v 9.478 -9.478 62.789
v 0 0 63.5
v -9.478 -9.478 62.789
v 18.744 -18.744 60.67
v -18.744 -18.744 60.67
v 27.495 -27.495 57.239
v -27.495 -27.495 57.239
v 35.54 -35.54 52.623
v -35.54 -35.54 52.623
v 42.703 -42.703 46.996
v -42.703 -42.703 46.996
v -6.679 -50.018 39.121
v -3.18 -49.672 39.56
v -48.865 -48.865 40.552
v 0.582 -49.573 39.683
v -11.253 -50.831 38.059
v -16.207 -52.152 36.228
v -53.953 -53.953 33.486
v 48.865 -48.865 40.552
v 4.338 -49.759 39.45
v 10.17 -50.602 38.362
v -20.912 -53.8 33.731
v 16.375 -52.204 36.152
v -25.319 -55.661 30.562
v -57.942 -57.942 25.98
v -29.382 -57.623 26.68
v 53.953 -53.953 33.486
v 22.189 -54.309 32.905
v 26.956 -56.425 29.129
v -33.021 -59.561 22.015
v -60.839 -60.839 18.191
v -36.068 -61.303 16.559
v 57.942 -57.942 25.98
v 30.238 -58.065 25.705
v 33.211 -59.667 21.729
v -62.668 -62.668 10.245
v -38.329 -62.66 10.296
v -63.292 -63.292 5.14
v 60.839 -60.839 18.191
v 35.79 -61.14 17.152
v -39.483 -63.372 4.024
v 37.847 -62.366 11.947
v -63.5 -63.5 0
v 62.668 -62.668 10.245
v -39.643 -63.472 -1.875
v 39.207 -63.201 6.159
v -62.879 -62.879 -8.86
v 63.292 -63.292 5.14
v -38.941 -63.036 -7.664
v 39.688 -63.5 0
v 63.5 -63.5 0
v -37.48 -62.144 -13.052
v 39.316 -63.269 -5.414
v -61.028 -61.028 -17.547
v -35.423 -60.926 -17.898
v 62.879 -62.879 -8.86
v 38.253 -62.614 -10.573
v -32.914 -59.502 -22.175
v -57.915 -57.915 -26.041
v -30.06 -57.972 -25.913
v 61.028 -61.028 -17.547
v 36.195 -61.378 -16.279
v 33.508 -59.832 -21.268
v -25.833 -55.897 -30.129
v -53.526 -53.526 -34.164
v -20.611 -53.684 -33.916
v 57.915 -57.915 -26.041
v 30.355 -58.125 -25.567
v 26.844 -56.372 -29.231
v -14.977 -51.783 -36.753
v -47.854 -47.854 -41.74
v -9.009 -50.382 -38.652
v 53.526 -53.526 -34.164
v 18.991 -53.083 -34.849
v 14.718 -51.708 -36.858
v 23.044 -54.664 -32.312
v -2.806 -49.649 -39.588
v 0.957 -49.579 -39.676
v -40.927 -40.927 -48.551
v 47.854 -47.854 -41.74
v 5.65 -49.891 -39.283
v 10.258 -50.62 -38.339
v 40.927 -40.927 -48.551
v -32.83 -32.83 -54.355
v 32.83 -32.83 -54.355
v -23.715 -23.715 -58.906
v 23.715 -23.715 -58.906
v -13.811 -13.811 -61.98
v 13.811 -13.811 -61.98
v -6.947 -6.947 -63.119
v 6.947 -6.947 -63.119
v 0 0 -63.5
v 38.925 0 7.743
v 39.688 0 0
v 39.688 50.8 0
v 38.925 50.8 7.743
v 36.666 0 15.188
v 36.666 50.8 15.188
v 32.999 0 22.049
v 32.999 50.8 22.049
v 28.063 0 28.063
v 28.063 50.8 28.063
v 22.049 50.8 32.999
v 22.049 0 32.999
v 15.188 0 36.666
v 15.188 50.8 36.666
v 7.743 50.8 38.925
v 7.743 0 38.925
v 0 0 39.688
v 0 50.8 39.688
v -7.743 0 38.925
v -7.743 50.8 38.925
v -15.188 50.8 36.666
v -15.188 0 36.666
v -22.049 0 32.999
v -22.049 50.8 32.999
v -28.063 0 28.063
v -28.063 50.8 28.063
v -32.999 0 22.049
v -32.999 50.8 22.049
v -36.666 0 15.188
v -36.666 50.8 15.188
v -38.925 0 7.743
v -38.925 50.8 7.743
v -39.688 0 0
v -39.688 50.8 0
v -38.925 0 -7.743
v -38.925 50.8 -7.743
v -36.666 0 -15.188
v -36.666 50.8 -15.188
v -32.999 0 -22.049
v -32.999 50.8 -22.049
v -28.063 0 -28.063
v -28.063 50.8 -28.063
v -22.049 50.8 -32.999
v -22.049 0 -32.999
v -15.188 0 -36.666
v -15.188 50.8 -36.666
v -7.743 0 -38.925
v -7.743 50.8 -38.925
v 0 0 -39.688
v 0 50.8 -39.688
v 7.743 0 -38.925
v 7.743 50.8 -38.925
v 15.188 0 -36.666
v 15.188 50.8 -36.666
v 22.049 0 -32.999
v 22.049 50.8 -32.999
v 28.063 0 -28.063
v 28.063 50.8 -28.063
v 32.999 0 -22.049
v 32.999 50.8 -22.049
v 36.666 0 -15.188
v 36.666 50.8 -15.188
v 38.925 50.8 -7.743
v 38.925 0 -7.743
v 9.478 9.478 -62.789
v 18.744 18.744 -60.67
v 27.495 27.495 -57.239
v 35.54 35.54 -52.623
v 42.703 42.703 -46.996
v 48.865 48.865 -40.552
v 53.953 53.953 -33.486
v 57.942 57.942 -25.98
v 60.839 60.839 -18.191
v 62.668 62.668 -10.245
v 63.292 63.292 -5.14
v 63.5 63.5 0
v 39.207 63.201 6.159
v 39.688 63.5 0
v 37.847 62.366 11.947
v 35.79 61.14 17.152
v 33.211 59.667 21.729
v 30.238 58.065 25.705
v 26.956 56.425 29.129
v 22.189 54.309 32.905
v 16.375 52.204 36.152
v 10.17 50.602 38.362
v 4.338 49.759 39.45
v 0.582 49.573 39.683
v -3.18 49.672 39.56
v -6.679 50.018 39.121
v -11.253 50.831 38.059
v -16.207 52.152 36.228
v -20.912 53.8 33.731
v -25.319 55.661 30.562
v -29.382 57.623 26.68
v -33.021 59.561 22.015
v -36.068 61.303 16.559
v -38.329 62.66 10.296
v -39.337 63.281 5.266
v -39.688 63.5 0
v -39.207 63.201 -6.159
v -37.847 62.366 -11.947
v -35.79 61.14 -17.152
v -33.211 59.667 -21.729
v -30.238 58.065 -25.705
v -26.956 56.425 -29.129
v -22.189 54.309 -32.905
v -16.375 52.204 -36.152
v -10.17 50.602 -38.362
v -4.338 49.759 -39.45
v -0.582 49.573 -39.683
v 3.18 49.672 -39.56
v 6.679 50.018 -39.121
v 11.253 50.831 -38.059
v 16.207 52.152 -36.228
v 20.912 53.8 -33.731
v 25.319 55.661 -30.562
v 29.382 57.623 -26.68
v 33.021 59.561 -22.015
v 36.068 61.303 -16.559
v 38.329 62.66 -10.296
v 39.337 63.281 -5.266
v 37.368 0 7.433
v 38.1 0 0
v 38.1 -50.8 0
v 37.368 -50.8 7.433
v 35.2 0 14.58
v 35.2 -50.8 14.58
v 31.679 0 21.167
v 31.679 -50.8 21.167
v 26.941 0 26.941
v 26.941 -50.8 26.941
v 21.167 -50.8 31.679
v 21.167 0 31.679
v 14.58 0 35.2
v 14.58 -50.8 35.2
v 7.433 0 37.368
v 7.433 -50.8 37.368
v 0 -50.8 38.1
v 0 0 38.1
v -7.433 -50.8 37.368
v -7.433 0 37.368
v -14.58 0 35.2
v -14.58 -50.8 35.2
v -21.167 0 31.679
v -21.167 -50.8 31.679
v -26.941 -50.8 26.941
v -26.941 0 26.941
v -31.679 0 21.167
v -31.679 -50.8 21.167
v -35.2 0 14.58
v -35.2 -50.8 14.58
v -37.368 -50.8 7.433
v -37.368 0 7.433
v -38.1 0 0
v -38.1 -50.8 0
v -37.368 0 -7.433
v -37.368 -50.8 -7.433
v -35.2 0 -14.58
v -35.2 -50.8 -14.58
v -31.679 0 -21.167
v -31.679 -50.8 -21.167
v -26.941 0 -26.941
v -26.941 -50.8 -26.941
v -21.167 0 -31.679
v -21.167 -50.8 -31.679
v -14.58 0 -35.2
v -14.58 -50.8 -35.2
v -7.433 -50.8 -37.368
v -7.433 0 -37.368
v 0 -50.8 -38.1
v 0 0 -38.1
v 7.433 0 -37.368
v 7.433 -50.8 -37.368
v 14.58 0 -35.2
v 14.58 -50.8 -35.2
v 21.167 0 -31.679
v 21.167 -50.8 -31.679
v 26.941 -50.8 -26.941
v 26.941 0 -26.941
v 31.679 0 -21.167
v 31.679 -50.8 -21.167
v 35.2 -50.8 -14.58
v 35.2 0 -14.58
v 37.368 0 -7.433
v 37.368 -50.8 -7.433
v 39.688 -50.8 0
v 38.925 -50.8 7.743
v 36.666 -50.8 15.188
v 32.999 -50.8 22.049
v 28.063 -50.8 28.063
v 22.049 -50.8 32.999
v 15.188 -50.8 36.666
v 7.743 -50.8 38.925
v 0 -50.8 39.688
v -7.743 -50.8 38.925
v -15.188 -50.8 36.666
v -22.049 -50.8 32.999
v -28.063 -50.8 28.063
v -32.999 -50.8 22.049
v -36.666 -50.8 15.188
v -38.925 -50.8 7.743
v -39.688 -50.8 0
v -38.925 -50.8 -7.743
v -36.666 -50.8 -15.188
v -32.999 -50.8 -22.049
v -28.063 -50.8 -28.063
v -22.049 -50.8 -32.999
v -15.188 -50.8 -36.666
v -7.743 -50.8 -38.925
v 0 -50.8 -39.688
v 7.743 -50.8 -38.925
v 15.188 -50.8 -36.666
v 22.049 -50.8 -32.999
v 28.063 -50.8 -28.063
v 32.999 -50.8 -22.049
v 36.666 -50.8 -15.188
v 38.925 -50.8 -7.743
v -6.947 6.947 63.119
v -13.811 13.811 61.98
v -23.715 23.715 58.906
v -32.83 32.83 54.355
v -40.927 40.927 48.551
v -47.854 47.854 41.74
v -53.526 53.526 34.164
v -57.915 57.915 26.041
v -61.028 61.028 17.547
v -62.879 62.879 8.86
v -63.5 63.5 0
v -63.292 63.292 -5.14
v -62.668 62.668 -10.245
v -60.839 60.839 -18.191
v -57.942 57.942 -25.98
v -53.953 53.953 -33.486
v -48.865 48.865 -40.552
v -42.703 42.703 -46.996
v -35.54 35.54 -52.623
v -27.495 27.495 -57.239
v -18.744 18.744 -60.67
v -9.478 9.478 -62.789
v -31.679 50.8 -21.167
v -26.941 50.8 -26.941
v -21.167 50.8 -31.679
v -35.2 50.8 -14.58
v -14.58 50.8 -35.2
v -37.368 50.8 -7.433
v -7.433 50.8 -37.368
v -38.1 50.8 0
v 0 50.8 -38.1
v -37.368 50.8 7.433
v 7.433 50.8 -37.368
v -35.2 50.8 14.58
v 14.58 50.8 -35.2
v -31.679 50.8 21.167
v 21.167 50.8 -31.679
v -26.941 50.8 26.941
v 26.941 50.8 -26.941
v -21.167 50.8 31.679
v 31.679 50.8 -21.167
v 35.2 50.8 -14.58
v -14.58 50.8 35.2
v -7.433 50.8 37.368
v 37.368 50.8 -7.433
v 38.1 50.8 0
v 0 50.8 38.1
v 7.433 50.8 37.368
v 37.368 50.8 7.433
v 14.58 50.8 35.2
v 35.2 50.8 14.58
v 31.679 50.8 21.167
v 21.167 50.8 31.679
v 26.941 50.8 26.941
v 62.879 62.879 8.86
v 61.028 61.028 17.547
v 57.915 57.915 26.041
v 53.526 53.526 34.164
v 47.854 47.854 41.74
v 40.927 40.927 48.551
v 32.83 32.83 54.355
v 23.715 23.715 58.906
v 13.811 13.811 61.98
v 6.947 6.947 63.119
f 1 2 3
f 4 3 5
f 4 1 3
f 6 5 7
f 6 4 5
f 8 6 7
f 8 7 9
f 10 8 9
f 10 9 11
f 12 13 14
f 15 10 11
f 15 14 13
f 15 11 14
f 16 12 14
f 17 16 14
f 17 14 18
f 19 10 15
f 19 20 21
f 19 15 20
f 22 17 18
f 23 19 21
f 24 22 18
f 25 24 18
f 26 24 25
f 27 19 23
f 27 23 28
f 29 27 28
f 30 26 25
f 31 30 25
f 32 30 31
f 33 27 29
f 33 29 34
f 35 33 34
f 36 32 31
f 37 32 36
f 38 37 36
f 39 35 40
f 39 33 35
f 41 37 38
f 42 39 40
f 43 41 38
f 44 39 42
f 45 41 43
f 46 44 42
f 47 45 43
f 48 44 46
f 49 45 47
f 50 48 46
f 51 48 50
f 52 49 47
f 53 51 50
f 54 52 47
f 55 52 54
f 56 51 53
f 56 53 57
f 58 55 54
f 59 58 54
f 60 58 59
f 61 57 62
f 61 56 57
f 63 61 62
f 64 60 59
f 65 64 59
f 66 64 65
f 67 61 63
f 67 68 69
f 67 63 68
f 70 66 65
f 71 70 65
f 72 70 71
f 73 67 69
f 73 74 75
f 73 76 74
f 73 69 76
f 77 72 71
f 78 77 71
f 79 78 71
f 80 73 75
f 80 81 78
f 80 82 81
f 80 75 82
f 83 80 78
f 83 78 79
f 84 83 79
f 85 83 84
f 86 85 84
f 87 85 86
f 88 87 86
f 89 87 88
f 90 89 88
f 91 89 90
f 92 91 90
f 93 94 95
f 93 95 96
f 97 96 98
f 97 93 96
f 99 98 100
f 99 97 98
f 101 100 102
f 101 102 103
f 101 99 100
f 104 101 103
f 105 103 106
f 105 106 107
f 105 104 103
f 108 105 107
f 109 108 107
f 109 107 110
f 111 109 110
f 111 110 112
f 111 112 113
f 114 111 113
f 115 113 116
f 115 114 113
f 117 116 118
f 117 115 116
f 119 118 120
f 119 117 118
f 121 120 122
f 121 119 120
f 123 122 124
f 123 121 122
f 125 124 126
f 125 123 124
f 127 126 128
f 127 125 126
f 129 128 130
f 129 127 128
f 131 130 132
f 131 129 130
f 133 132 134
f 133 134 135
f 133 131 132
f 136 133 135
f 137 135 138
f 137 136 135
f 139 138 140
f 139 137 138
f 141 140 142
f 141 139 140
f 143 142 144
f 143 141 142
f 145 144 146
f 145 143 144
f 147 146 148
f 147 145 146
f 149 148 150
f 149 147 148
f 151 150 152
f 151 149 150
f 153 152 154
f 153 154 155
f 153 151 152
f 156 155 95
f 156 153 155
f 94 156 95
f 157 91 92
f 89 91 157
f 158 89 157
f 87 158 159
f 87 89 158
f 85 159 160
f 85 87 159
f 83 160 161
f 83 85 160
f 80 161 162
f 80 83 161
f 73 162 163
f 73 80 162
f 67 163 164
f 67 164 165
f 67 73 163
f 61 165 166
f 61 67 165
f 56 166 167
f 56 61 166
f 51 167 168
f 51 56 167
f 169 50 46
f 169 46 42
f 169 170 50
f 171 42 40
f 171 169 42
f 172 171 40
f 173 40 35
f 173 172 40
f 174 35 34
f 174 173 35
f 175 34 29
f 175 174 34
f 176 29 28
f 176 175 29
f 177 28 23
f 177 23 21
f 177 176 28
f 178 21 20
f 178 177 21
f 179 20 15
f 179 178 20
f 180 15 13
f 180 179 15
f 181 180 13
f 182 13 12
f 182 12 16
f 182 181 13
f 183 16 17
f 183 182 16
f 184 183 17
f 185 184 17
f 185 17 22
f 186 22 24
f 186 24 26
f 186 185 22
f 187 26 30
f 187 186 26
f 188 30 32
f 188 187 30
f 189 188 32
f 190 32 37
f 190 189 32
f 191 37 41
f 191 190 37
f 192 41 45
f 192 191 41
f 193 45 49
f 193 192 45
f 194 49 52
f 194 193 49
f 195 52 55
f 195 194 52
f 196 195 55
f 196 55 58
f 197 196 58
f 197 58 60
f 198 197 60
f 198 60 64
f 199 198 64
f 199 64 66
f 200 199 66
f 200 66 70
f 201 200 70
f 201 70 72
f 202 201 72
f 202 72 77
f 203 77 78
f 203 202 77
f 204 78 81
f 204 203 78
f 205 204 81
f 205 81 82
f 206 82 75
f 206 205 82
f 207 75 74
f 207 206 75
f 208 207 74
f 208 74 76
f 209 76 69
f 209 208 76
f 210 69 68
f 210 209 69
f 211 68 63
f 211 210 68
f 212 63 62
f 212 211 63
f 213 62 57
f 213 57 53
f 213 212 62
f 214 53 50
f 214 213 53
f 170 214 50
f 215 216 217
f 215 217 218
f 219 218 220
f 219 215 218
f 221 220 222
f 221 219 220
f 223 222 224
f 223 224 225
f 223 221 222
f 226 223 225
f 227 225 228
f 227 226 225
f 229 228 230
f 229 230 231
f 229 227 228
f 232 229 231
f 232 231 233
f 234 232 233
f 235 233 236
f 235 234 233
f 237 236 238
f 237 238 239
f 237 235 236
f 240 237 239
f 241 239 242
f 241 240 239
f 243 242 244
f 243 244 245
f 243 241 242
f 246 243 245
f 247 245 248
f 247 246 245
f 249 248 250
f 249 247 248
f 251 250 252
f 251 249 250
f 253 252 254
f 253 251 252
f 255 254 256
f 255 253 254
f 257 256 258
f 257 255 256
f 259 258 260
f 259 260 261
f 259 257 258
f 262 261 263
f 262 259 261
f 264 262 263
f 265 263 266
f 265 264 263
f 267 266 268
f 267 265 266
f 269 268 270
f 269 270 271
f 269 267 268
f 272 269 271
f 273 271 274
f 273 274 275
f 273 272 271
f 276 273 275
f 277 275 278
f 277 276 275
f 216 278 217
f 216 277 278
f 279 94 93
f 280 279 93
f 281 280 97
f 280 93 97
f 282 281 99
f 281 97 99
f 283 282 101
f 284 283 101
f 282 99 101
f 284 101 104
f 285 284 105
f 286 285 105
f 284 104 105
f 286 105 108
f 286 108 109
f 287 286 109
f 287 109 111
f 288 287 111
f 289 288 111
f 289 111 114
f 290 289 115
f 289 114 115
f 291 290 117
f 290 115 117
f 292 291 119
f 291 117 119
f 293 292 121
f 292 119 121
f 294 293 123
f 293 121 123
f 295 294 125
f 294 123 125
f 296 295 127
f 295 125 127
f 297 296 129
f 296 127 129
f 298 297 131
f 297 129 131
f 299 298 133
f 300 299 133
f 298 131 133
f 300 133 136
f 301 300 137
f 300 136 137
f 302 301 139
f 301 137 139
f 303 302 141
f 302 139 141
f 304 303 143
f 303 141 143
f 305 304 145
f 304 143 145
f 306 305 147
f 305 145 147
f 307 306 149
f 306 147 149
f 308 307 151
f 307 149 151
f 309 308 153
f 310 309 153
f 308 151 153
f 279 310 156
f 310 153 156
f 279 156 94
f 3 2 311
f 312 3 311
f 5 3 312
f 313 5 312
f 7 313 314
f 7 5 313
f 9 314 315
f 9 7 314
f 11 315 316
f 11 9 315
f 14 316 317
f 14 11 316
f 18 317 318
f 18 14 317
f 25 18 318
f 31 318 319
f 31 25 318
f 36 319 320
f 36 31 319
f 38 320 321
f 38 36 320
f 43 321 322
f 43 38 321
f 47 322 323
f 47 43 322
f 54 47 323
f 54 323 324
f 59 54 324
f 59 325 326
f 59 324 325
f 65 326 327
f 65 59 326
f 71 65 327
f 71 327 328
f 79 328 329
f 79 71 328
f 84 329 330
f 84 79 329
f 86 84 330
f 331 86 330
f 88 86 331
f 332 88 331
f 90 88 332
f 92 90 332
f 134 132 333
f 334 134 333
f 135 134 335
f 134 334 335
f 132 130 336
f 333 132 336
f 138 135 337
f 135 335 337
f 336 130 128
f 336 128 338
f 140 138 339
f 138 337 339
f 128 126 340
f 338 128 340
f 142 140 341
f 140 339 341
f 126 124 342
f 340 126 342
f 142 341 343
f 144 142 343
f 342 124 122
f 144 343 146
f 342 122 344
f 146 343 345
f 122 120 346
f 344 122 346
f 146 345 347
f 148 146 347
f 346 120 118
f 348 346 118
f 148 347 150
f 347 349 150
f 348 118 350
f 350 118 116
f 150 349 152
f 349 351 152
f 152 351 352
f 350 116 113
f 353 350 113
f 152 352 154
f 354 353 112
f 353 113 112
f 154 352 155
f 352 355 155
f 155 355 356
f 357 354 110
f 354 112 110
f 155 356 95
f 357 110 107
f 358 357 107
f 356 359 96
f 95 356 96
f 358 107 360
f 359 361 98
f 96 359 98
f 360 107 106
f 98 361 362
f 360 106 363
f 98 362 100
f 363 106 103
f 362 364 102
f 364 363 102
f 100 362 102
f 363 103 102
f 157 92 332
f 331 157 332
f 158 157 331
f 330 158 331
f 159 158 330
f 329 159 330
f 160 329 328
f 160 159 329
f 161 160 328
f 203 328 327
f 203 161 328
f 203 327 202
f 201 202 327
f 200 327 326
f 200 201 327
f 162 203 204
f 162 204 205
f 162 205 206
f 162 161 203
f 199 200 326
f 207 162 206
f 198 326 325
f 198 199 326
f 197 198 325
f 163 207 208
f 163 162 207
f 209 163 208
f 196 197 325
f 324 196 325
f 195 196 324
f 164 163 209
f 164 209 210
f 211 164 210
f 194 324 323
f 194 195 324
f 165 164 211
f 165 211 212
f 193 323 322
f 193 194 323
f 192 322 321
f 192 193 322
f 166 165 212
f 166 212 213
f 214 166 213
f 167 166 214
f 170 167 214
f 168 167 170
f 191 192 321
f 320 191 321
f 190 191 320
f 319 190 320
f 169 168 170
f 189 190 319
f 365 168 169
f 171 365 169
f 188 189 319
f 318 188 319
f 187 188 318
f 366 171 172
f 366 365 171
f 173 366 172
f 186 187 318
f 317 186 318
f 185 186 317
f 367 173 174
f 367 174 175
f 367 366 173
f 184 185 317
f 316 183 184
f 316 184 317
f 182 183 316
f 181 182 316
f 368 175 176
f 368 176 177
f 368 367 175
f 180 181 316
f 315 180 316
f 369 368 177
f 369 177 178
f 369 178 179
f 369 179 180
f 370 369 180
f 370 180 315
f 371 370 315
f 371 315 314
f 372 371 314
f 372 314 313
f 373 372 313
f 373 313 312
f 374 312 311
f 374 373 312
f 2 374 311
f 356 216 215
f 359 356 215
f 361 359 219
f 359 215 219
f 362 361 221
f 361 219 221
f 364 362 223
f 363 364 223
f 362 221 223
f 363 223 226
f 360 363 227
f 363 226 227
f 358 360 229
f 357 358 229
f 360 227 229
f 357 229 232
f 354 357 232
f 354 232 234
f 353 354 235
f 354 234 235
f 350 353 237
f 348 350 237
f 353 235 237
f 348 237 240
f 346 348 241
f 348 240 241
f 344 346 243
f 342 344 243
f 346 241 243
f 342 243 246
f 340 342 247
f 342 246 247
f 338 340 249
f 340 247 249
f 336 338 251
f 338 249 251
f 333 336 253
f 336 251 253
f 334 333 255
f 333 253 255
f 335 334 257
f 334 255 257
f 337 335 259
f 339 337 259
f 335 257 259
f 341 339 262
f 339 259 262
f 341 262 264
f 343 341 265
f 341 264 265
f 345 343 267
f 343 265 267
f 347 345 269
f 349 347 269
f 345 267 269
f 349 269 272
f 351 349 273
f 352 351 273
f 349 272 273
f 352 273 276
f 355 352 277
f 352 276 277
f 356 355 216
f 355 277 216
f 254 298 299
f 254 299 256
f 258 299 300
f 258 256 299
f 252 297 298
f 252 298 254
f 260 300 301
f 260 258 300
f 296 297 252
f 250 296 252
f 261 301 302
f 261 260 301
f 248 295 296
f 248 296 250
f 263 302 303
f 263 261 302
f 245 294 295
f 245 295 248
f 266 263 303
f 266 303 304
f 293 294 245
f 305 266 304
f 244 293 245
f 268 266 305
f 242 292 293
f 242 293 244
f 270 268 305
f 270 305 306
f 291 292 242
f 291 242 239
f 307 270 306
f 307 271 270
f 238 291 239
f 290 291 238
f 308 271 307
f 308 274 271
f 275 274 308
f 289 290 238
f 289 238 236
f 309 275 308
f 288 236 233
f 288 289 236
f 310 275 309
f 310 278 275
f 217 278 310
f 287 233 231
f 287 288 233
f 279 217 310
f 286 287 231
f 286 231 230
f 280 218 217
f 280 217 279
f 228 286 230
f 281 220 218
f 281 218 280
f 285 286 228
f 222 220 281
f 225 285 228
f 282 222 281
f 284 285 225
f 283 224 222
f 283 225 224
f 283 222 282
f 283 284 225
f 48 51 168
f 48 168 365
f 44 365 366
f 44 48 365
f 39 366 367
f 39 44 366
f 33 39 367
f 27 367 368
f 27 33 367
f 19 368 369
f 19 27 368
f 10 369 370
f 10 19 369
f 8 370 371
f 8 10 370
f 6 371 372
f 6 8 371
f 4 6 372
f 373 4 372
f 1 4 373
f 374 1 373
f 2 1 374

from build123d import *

# Parameters (mm, degrees)
F0_R          = 39.6875
F0_R_2        = 38.1
F2_DEPTH      = 50.8
F2_DEPTH_BACK = 50.8
F1_R          = 63.5
F1_R_2        = 26.9875
F1_R_3        = 25.4
F3_DEPTH      = 63.5
F3_DEPTH_BACK = 63.5
F0_R_3        = 63.5
F6_DEPTH      = 63.5


# Not quite as in the source:
# - a feature of the source that left no trace in its solid (it failed there, or was rolled back) is left out


with BuildPart() as f2:
    # F0 (on Front) → F2 (new body, two sides)
    with BuildSketch(Plane.XZ) as f2_sk:
        Circle(F0_R)
        Circle(F0_R_2, mode=Mode.SUBTRACT)
    extrude(amount=-F2_DEPTH)
    extrude(f2_sk.sketch, amount=F2_DEPTH_BACK)


with BuildPart() as f3:
    # F1 (on Right) → F3 (new body, two sides)
    with BuildSketch(Plane.YZ) as f3_sk:
        Circle(F1_R)
        Circle(F1_R_2, mode=Mode.SUBTRACT)
        Circle(F1_R_2)
        Circle(F1_R_3, mode=Mode.SUBTRACT)
        Circle(F1_R_3)
    extrude(amount=F3_DEPTH)
    extrude(f3_sk.sketch, amount=-F3_DEPTH_BACK)

    # F0 (on Front) → F6 (intersect, symmetric)
    with BuildSketch(Plane.XZ):
        Circle(F0_R_3)
        Circle(F0_R, mode=Mode.SUBTRACT)
    extrude(amount=F6_DEPTH, both=True, mode=Mode.INTERSECT)


solid = Compound([f2.part, f3.part])
